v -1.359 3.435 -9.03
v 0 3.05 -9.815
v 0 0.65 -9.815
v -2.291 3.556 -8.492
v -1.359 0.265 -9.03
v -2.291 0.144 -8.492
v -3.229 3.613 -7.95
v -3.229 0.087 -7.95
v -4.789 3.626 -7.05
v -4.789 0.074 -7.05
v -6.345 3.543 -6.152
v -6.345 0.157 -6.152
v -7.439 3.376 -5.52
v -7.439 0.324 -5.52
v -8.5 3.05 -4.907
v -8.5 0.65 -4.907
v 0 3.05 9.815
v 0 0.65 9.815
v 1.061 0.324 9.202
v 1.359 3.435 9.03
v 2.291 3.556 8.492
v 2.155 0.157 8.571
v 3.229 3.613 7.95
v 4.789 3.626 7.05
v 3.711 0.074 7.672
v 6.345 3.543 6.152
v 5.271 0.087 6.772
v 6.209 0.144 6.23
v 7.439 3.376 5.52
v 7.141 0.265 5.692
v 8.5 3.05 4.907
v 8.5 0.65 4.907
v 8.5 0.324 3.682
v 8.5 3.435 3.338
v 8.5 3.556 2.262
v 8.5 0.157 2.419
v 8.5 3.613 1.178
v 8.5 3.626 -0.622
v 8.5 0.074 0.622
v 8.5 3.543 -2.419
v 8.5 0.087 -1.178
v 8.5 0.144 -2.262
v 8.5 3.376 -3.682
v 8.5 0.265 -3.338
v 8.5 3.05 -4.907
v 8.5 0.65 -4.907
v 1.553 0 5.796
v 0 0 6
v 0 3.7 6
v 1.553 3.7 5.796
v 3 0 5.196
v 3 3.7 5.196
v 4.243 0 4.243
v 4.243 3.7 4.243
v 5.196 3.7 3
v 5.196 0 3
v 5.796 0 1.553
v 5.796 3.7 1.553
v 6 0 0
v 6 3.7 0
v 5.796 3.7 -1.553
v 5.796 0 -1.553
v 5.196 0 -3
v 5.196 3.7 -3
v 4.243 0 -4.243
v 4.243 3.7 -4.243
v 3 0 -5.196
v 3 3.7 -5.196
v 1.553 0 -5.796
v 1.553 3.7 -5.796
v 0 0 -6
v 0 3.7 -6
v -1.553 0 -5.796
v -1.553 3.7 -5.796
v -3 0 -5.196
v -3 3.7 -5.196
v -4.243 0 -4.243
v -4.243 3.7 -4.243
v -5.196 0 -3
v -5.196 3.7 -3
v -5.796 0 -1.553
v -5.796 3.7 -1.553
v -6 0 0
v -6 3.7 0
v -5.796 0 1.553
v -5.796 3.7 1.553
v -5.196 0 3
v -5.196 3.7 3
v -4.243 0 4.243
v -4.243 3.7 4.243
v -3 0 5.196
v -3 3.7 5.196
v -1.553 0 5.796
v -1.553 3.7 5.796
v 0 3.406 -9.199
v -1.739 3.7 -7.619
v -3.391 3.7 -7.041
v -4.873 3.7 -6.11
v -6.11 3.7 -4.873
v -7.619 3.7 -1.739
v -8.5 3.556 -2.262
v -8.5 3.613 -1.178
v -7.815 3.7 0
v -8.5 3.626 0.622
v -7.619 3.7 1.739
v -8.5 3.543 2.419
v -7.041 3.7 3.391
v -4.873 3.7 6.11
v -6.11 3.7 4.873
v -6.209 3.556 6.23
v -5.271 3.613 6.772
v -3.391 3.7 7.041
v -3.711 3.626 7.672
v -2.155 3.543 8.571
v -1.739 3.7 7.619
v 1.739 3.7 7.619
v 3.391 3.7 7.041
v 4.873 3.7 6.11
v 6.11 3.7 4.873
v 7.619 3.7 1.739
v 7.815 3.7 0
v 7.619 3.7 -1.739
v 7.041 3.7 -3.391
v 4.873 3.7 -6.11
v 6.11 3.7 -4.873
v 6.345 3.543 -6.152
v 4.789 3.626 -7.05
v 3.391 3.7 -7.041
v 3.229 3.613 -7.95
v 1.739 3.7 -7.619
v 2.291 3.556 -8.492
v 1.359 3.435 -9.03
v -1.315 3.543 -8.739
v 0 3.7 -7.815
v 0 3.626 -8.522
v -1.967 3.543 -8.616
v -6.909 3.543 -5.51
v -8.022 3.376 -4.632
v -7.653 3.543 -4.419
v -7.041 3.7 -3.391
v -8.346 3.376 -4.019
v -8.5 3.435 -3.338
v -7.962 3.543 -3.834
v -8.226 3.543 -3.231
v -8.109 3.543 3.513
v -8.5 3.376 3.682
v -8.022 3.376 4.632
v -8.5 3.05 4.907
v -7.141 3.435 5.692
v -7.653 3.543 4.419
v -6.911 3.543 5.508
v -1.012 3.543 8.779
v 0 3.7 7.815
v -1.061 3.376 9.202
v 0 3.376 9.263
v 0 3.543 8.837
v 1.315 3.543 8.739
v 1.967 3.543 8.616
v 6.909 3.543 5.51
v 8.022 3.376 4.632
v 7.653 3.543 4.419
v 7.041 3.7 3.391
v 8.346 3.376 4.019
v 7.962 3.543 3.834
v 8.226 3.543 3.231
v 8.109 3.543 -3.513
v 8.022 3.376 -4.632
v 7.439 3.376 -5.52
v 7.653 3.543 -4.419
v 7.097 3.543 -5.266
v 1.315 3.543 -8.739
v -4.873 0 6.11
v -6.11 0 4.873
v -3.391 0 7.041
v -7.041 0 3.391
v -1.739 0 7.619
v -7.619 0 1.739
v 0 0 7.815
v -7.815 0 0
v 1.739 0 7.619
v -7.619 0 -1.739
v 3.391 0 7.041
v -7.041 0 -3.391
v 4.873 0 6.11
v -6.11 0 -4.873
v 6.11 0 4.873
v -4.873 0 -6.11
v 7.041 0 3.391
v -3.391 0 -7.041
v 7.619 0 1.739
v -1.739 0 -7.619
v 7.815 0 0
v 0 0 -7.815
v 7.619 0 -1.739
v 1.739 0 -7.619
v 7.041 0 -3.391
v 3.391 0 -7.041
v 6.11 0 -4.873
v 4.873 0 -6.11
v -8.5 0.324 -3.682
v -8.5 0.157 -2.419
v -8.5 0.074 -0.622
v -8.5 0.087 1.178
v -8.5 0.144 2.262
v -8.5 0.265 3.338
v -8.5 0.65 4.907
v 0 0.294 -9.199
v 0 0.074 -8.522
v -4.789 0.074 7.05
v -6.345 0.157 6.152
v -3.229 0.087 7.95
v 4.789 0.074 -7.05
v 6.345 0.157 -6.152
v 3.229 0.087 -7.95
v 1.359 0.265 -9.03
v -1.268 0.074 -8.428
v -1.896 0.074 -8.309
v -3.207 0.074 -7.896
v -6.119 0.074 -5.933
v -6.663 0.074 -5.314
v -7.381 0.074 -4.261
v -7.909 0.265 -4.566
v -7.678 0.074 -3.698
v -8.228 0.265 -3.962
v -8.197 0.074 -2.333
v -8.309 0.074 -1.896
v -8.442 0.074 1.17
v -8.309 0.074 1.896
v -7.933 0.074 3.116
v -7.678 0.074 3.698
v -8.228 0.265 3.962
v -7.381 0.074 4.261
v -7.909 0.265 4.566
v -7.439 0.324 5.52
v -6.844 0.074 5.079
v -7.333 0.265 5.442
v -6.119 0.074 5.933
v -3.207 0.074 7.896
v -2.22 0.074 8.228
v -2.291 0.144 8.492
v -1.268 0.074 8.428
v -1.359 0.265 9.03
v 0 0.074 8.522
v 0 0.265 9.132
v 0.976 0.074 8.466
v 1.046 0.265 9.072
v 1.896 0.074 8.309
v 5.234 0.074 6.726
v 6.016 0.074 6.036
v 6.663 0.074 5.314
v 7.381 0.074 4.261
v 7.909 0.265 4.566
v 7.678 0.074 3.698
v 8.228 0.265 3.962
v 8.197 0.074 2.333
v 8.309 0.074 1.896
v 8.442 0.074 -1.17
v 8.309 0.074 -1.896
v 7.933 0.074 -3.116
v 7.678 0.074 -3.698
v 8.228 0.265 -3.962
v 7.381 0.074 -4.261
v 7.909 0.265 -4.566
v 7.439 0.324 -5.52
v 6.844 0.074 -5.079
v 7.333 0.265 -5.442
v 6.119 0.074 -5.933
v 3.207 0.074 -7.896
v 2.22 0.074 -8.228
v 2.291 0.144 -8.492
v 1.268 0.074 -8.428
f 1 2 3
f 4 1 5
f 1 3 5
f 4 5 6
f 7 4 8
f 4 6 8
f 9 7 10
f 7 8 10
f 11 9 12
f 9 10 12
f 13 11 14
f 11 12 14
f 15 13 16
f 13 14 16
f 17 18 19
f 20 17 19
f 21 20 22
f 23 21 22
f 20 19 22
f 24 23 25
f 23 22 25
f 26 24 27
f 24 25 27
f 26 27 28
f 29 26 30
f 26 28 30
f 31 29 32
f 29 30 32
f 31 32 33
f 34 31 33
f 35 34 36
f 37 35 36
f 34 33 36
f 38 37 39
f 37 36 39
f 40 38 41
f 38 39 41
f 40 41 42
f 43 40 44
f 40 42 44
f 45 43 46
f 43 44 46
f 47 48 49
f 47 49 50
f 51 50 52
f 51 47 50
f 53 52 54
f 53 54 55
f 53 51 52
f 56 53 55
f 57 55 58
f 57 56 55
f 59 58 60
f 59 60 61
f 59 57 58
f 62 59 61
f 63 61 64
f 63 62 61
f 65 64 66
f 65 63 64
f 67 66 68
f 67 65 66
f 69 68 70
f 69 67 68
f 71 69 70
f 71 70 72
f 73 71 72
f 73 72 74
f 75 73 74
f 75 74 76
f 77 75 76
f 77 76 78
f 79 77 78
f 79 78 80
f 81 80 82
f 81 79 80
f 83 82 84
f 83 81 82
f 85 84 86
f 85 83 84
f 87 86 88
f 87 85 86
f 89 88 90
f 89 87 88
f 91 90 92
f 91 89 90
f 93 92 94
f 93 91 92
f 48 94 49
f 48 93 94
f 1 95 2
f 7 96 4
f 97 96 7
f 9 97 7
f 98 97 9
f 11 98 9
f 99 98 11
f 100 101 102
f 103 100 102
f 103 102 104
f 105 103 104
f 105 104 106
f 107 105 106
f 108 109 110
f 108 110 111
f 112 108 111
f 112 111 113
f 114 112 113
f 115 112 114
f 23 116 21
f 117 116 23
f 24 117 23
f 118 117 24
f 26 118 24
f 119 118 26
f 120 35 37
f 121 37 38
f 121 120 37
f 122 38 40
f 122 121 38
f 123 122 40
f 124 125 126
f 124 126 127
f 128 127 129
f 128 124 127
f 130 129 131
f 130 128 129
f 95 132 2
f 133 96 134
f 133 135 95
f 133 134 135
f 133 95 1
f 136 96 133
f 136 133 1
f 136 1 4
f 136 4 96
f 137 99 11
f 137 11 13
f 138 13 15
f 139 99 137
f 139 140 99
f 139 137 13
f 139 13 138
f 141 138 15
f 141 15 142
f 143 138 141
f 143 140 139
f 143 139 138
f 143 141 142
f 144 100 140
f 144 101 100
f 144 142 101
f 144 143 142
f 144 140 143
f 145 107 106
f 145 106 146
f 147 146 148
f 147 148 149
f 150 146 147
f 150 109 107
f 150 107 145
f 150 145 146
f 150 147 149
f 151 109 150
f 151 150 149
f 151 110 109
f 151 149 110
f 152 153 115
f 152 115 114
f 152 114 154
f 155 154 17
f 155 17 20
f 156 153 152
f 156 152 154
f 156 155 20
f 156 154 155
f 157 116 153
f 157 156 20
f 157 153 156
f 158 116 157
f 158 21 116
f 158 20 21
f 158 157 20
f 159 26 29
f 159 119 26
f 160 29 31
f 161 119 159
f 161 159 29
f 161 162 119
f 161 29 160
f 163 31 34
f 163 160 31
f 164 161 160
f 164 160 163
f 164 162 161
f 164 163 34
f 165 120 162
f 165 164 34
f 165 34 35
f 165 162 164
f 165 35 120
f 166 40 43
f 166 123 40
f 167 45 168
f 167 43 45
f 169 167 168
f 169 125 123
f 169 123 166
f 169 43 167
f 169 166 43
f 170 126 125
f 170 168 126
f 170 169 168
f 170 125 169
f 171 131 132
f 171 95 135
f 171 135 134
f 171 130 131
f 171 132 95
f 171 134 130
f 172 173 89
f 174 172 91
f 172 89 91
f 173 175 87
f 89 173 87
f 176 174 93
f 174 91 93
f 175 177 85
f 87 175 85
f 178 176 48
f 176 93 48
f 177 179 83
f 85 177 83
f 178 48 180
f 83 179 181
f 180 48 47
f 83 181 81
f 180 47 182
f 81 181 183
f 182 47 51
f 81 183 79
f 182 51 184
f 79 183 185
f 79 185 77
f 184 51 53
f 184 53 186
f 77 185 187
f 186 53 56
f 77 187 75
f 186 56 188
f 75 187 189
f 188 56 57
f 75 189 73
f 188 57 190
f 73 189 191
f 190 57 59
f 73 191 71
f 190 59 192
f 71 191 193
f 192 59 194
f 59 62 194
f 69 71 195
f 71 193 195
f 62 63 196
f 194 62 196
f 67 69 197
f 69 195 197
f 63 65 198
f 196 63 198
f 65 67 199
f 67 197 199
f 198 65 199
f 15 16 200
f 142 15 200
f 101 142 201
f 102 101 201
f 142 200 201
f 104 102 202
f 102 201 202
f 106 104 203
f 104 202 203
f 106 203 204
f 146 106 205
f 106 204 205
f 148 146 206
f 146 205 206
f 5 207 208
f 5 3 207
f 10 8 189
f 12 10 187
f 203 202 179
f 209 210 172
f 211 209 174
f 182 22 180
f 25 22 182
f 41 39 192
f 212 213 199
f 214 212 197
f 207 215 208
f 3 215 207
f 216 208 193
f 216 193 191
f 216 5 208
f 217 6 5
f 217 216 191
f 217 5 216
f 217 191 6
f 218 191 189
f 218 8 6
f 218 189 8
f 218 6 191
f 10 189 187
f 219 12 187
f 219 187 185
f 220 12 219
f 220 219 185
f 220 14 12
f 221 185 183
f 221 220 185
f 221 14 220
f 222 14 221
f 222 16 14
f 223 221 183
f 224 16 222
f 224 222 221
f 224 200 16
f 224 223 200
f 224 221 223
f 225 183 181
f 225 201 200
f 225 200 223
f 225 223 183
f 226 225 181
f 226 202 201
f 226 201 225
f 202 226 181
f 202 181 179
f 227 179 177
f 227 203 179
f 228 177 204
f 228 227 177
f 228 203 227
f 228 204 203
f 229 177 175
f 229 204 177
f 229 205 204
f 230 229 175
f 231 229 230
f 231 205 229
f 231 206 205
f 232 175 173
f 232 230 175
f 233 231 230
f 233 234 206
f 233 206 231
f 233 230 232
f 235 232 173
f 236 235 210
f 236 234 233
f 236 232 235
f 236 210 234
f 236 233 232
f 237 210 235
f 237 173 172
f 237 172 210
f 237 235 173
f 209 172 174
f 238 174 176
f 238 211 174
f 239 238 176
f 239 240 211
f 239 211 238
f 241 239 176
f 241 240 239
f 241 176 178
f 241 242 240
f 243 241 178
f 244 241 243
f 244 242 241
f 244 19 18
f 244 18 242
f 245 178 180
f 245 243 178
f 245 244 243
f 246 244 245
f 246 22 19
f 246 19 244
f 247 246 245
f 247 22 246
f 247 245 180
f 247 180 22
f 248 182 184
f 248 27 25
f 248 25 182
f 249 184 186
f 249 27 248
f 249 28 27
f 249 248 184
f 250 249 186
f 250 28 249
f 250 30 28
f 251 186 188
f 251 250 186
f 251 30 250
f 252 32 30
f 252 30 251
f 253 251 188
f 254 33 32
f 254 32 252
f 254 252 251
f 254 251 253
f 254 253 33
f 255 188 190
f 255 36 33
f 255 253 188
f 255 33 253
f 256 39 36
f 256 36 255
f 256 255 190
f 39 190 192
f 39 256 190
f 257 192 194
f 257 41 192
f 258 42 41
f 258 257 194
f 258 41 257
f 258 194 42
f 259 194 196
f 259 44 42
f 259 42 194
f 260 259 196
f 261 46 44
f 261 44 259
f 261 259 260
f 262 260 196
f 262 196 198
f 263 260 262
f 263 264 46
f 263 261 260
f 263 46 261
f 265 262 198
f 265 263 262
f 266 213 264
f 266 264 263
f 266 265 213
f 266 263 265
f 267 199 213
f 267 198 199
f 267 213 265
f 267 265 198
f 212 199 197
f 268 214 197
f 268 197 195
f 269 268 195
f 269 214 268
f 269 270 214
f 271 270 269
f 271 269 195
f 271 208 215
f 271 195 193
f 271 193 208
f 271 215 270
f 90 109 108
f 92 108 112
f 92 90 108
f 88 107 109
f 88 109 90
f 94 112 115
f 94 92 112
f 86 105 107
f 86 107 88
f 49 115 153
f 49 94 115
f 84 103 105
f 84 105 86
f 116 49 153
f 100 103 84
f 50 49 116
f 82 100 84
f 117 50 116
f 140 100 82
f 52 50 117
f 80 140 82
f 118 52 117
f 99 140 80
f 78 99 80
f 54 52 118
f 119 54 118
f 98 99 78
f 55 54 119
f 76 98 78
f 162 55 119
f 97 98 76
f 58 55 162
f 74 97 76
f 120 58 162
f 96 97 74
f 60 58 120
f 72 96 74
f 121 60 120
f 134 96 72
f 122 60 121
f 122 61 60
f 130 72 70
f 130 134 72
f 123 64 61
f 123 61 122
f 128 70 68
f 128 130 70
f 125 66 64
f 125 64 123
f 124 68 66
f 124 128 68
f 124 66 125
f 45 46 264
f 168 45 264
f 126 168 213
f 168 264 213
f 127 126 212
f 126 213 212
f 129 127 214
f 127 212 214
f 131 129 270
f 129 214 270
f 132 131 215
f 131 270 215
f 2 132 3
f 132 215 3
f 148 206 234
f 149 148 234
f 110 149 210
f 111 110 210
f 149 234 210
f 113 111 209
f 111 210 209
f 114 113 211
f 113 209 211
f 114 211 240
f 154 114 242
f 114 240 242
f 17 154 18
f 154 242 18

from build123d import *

# Parameters (mm, degrees)
CROQUIS1_R              = 6
SALIENTE_EXTRUIR1_DEPTH = 3.7


with BuildPart() as part:
    # Croquis1 → Saliente-Extruir1 (new body)
    with BuildSketch(Plane(origin=(0, 0, 0), x_dir=(1, 0, 0), z_dir=(0, 1, 0))):
        Polygon((0, 9.814954576), (-8.5, 4.907477288), (-8.5, -4.907477288), (0, -9.814954576), (8.5, -4.907477288), (8.5, 4.907477288), align=None)
        with Locations(Location((0, 0, 0), (0, 0, 270))):
            Circle(CROQUIS1_R, mode=Mode.SUBTRACT)
    extrude(amount=SALIENTE_EXTRUIR1_DEPTH)

    # Croquis2 → Cortar-Revolución1 (revolve, cut)
    with BuildSketch(Plane(origin=(0, 0, 0), x_dir=(0, 0, -1), z_dir=(1, 0, 0))):
        with BuildLine():
            Line((7.814954576, 3.7), (9.814954576, 3.7))
            Line((9.814954576, 3.7), (9.814954576, 3.05))
            ThreePointArc((9.814954576, 3.05), (8.866441618, 3.533421668), (7.814954576, 3.7))
        make_face()
        with BuildLine():
            Line((9.814954576, 0.65), (9.814954576, 0))
            Line((9.814954576, 0), (7.814954576, 0))
            ThreePointArc((7.814954576, 0), (8.866441618, 0.166578332), (9.814954576, 0.65))
        make_face()
    revolve(axis=Axis((0, 0, 0), (0, 1, 0)), mode=Mode.SUBTRACT)


solid = part.part
